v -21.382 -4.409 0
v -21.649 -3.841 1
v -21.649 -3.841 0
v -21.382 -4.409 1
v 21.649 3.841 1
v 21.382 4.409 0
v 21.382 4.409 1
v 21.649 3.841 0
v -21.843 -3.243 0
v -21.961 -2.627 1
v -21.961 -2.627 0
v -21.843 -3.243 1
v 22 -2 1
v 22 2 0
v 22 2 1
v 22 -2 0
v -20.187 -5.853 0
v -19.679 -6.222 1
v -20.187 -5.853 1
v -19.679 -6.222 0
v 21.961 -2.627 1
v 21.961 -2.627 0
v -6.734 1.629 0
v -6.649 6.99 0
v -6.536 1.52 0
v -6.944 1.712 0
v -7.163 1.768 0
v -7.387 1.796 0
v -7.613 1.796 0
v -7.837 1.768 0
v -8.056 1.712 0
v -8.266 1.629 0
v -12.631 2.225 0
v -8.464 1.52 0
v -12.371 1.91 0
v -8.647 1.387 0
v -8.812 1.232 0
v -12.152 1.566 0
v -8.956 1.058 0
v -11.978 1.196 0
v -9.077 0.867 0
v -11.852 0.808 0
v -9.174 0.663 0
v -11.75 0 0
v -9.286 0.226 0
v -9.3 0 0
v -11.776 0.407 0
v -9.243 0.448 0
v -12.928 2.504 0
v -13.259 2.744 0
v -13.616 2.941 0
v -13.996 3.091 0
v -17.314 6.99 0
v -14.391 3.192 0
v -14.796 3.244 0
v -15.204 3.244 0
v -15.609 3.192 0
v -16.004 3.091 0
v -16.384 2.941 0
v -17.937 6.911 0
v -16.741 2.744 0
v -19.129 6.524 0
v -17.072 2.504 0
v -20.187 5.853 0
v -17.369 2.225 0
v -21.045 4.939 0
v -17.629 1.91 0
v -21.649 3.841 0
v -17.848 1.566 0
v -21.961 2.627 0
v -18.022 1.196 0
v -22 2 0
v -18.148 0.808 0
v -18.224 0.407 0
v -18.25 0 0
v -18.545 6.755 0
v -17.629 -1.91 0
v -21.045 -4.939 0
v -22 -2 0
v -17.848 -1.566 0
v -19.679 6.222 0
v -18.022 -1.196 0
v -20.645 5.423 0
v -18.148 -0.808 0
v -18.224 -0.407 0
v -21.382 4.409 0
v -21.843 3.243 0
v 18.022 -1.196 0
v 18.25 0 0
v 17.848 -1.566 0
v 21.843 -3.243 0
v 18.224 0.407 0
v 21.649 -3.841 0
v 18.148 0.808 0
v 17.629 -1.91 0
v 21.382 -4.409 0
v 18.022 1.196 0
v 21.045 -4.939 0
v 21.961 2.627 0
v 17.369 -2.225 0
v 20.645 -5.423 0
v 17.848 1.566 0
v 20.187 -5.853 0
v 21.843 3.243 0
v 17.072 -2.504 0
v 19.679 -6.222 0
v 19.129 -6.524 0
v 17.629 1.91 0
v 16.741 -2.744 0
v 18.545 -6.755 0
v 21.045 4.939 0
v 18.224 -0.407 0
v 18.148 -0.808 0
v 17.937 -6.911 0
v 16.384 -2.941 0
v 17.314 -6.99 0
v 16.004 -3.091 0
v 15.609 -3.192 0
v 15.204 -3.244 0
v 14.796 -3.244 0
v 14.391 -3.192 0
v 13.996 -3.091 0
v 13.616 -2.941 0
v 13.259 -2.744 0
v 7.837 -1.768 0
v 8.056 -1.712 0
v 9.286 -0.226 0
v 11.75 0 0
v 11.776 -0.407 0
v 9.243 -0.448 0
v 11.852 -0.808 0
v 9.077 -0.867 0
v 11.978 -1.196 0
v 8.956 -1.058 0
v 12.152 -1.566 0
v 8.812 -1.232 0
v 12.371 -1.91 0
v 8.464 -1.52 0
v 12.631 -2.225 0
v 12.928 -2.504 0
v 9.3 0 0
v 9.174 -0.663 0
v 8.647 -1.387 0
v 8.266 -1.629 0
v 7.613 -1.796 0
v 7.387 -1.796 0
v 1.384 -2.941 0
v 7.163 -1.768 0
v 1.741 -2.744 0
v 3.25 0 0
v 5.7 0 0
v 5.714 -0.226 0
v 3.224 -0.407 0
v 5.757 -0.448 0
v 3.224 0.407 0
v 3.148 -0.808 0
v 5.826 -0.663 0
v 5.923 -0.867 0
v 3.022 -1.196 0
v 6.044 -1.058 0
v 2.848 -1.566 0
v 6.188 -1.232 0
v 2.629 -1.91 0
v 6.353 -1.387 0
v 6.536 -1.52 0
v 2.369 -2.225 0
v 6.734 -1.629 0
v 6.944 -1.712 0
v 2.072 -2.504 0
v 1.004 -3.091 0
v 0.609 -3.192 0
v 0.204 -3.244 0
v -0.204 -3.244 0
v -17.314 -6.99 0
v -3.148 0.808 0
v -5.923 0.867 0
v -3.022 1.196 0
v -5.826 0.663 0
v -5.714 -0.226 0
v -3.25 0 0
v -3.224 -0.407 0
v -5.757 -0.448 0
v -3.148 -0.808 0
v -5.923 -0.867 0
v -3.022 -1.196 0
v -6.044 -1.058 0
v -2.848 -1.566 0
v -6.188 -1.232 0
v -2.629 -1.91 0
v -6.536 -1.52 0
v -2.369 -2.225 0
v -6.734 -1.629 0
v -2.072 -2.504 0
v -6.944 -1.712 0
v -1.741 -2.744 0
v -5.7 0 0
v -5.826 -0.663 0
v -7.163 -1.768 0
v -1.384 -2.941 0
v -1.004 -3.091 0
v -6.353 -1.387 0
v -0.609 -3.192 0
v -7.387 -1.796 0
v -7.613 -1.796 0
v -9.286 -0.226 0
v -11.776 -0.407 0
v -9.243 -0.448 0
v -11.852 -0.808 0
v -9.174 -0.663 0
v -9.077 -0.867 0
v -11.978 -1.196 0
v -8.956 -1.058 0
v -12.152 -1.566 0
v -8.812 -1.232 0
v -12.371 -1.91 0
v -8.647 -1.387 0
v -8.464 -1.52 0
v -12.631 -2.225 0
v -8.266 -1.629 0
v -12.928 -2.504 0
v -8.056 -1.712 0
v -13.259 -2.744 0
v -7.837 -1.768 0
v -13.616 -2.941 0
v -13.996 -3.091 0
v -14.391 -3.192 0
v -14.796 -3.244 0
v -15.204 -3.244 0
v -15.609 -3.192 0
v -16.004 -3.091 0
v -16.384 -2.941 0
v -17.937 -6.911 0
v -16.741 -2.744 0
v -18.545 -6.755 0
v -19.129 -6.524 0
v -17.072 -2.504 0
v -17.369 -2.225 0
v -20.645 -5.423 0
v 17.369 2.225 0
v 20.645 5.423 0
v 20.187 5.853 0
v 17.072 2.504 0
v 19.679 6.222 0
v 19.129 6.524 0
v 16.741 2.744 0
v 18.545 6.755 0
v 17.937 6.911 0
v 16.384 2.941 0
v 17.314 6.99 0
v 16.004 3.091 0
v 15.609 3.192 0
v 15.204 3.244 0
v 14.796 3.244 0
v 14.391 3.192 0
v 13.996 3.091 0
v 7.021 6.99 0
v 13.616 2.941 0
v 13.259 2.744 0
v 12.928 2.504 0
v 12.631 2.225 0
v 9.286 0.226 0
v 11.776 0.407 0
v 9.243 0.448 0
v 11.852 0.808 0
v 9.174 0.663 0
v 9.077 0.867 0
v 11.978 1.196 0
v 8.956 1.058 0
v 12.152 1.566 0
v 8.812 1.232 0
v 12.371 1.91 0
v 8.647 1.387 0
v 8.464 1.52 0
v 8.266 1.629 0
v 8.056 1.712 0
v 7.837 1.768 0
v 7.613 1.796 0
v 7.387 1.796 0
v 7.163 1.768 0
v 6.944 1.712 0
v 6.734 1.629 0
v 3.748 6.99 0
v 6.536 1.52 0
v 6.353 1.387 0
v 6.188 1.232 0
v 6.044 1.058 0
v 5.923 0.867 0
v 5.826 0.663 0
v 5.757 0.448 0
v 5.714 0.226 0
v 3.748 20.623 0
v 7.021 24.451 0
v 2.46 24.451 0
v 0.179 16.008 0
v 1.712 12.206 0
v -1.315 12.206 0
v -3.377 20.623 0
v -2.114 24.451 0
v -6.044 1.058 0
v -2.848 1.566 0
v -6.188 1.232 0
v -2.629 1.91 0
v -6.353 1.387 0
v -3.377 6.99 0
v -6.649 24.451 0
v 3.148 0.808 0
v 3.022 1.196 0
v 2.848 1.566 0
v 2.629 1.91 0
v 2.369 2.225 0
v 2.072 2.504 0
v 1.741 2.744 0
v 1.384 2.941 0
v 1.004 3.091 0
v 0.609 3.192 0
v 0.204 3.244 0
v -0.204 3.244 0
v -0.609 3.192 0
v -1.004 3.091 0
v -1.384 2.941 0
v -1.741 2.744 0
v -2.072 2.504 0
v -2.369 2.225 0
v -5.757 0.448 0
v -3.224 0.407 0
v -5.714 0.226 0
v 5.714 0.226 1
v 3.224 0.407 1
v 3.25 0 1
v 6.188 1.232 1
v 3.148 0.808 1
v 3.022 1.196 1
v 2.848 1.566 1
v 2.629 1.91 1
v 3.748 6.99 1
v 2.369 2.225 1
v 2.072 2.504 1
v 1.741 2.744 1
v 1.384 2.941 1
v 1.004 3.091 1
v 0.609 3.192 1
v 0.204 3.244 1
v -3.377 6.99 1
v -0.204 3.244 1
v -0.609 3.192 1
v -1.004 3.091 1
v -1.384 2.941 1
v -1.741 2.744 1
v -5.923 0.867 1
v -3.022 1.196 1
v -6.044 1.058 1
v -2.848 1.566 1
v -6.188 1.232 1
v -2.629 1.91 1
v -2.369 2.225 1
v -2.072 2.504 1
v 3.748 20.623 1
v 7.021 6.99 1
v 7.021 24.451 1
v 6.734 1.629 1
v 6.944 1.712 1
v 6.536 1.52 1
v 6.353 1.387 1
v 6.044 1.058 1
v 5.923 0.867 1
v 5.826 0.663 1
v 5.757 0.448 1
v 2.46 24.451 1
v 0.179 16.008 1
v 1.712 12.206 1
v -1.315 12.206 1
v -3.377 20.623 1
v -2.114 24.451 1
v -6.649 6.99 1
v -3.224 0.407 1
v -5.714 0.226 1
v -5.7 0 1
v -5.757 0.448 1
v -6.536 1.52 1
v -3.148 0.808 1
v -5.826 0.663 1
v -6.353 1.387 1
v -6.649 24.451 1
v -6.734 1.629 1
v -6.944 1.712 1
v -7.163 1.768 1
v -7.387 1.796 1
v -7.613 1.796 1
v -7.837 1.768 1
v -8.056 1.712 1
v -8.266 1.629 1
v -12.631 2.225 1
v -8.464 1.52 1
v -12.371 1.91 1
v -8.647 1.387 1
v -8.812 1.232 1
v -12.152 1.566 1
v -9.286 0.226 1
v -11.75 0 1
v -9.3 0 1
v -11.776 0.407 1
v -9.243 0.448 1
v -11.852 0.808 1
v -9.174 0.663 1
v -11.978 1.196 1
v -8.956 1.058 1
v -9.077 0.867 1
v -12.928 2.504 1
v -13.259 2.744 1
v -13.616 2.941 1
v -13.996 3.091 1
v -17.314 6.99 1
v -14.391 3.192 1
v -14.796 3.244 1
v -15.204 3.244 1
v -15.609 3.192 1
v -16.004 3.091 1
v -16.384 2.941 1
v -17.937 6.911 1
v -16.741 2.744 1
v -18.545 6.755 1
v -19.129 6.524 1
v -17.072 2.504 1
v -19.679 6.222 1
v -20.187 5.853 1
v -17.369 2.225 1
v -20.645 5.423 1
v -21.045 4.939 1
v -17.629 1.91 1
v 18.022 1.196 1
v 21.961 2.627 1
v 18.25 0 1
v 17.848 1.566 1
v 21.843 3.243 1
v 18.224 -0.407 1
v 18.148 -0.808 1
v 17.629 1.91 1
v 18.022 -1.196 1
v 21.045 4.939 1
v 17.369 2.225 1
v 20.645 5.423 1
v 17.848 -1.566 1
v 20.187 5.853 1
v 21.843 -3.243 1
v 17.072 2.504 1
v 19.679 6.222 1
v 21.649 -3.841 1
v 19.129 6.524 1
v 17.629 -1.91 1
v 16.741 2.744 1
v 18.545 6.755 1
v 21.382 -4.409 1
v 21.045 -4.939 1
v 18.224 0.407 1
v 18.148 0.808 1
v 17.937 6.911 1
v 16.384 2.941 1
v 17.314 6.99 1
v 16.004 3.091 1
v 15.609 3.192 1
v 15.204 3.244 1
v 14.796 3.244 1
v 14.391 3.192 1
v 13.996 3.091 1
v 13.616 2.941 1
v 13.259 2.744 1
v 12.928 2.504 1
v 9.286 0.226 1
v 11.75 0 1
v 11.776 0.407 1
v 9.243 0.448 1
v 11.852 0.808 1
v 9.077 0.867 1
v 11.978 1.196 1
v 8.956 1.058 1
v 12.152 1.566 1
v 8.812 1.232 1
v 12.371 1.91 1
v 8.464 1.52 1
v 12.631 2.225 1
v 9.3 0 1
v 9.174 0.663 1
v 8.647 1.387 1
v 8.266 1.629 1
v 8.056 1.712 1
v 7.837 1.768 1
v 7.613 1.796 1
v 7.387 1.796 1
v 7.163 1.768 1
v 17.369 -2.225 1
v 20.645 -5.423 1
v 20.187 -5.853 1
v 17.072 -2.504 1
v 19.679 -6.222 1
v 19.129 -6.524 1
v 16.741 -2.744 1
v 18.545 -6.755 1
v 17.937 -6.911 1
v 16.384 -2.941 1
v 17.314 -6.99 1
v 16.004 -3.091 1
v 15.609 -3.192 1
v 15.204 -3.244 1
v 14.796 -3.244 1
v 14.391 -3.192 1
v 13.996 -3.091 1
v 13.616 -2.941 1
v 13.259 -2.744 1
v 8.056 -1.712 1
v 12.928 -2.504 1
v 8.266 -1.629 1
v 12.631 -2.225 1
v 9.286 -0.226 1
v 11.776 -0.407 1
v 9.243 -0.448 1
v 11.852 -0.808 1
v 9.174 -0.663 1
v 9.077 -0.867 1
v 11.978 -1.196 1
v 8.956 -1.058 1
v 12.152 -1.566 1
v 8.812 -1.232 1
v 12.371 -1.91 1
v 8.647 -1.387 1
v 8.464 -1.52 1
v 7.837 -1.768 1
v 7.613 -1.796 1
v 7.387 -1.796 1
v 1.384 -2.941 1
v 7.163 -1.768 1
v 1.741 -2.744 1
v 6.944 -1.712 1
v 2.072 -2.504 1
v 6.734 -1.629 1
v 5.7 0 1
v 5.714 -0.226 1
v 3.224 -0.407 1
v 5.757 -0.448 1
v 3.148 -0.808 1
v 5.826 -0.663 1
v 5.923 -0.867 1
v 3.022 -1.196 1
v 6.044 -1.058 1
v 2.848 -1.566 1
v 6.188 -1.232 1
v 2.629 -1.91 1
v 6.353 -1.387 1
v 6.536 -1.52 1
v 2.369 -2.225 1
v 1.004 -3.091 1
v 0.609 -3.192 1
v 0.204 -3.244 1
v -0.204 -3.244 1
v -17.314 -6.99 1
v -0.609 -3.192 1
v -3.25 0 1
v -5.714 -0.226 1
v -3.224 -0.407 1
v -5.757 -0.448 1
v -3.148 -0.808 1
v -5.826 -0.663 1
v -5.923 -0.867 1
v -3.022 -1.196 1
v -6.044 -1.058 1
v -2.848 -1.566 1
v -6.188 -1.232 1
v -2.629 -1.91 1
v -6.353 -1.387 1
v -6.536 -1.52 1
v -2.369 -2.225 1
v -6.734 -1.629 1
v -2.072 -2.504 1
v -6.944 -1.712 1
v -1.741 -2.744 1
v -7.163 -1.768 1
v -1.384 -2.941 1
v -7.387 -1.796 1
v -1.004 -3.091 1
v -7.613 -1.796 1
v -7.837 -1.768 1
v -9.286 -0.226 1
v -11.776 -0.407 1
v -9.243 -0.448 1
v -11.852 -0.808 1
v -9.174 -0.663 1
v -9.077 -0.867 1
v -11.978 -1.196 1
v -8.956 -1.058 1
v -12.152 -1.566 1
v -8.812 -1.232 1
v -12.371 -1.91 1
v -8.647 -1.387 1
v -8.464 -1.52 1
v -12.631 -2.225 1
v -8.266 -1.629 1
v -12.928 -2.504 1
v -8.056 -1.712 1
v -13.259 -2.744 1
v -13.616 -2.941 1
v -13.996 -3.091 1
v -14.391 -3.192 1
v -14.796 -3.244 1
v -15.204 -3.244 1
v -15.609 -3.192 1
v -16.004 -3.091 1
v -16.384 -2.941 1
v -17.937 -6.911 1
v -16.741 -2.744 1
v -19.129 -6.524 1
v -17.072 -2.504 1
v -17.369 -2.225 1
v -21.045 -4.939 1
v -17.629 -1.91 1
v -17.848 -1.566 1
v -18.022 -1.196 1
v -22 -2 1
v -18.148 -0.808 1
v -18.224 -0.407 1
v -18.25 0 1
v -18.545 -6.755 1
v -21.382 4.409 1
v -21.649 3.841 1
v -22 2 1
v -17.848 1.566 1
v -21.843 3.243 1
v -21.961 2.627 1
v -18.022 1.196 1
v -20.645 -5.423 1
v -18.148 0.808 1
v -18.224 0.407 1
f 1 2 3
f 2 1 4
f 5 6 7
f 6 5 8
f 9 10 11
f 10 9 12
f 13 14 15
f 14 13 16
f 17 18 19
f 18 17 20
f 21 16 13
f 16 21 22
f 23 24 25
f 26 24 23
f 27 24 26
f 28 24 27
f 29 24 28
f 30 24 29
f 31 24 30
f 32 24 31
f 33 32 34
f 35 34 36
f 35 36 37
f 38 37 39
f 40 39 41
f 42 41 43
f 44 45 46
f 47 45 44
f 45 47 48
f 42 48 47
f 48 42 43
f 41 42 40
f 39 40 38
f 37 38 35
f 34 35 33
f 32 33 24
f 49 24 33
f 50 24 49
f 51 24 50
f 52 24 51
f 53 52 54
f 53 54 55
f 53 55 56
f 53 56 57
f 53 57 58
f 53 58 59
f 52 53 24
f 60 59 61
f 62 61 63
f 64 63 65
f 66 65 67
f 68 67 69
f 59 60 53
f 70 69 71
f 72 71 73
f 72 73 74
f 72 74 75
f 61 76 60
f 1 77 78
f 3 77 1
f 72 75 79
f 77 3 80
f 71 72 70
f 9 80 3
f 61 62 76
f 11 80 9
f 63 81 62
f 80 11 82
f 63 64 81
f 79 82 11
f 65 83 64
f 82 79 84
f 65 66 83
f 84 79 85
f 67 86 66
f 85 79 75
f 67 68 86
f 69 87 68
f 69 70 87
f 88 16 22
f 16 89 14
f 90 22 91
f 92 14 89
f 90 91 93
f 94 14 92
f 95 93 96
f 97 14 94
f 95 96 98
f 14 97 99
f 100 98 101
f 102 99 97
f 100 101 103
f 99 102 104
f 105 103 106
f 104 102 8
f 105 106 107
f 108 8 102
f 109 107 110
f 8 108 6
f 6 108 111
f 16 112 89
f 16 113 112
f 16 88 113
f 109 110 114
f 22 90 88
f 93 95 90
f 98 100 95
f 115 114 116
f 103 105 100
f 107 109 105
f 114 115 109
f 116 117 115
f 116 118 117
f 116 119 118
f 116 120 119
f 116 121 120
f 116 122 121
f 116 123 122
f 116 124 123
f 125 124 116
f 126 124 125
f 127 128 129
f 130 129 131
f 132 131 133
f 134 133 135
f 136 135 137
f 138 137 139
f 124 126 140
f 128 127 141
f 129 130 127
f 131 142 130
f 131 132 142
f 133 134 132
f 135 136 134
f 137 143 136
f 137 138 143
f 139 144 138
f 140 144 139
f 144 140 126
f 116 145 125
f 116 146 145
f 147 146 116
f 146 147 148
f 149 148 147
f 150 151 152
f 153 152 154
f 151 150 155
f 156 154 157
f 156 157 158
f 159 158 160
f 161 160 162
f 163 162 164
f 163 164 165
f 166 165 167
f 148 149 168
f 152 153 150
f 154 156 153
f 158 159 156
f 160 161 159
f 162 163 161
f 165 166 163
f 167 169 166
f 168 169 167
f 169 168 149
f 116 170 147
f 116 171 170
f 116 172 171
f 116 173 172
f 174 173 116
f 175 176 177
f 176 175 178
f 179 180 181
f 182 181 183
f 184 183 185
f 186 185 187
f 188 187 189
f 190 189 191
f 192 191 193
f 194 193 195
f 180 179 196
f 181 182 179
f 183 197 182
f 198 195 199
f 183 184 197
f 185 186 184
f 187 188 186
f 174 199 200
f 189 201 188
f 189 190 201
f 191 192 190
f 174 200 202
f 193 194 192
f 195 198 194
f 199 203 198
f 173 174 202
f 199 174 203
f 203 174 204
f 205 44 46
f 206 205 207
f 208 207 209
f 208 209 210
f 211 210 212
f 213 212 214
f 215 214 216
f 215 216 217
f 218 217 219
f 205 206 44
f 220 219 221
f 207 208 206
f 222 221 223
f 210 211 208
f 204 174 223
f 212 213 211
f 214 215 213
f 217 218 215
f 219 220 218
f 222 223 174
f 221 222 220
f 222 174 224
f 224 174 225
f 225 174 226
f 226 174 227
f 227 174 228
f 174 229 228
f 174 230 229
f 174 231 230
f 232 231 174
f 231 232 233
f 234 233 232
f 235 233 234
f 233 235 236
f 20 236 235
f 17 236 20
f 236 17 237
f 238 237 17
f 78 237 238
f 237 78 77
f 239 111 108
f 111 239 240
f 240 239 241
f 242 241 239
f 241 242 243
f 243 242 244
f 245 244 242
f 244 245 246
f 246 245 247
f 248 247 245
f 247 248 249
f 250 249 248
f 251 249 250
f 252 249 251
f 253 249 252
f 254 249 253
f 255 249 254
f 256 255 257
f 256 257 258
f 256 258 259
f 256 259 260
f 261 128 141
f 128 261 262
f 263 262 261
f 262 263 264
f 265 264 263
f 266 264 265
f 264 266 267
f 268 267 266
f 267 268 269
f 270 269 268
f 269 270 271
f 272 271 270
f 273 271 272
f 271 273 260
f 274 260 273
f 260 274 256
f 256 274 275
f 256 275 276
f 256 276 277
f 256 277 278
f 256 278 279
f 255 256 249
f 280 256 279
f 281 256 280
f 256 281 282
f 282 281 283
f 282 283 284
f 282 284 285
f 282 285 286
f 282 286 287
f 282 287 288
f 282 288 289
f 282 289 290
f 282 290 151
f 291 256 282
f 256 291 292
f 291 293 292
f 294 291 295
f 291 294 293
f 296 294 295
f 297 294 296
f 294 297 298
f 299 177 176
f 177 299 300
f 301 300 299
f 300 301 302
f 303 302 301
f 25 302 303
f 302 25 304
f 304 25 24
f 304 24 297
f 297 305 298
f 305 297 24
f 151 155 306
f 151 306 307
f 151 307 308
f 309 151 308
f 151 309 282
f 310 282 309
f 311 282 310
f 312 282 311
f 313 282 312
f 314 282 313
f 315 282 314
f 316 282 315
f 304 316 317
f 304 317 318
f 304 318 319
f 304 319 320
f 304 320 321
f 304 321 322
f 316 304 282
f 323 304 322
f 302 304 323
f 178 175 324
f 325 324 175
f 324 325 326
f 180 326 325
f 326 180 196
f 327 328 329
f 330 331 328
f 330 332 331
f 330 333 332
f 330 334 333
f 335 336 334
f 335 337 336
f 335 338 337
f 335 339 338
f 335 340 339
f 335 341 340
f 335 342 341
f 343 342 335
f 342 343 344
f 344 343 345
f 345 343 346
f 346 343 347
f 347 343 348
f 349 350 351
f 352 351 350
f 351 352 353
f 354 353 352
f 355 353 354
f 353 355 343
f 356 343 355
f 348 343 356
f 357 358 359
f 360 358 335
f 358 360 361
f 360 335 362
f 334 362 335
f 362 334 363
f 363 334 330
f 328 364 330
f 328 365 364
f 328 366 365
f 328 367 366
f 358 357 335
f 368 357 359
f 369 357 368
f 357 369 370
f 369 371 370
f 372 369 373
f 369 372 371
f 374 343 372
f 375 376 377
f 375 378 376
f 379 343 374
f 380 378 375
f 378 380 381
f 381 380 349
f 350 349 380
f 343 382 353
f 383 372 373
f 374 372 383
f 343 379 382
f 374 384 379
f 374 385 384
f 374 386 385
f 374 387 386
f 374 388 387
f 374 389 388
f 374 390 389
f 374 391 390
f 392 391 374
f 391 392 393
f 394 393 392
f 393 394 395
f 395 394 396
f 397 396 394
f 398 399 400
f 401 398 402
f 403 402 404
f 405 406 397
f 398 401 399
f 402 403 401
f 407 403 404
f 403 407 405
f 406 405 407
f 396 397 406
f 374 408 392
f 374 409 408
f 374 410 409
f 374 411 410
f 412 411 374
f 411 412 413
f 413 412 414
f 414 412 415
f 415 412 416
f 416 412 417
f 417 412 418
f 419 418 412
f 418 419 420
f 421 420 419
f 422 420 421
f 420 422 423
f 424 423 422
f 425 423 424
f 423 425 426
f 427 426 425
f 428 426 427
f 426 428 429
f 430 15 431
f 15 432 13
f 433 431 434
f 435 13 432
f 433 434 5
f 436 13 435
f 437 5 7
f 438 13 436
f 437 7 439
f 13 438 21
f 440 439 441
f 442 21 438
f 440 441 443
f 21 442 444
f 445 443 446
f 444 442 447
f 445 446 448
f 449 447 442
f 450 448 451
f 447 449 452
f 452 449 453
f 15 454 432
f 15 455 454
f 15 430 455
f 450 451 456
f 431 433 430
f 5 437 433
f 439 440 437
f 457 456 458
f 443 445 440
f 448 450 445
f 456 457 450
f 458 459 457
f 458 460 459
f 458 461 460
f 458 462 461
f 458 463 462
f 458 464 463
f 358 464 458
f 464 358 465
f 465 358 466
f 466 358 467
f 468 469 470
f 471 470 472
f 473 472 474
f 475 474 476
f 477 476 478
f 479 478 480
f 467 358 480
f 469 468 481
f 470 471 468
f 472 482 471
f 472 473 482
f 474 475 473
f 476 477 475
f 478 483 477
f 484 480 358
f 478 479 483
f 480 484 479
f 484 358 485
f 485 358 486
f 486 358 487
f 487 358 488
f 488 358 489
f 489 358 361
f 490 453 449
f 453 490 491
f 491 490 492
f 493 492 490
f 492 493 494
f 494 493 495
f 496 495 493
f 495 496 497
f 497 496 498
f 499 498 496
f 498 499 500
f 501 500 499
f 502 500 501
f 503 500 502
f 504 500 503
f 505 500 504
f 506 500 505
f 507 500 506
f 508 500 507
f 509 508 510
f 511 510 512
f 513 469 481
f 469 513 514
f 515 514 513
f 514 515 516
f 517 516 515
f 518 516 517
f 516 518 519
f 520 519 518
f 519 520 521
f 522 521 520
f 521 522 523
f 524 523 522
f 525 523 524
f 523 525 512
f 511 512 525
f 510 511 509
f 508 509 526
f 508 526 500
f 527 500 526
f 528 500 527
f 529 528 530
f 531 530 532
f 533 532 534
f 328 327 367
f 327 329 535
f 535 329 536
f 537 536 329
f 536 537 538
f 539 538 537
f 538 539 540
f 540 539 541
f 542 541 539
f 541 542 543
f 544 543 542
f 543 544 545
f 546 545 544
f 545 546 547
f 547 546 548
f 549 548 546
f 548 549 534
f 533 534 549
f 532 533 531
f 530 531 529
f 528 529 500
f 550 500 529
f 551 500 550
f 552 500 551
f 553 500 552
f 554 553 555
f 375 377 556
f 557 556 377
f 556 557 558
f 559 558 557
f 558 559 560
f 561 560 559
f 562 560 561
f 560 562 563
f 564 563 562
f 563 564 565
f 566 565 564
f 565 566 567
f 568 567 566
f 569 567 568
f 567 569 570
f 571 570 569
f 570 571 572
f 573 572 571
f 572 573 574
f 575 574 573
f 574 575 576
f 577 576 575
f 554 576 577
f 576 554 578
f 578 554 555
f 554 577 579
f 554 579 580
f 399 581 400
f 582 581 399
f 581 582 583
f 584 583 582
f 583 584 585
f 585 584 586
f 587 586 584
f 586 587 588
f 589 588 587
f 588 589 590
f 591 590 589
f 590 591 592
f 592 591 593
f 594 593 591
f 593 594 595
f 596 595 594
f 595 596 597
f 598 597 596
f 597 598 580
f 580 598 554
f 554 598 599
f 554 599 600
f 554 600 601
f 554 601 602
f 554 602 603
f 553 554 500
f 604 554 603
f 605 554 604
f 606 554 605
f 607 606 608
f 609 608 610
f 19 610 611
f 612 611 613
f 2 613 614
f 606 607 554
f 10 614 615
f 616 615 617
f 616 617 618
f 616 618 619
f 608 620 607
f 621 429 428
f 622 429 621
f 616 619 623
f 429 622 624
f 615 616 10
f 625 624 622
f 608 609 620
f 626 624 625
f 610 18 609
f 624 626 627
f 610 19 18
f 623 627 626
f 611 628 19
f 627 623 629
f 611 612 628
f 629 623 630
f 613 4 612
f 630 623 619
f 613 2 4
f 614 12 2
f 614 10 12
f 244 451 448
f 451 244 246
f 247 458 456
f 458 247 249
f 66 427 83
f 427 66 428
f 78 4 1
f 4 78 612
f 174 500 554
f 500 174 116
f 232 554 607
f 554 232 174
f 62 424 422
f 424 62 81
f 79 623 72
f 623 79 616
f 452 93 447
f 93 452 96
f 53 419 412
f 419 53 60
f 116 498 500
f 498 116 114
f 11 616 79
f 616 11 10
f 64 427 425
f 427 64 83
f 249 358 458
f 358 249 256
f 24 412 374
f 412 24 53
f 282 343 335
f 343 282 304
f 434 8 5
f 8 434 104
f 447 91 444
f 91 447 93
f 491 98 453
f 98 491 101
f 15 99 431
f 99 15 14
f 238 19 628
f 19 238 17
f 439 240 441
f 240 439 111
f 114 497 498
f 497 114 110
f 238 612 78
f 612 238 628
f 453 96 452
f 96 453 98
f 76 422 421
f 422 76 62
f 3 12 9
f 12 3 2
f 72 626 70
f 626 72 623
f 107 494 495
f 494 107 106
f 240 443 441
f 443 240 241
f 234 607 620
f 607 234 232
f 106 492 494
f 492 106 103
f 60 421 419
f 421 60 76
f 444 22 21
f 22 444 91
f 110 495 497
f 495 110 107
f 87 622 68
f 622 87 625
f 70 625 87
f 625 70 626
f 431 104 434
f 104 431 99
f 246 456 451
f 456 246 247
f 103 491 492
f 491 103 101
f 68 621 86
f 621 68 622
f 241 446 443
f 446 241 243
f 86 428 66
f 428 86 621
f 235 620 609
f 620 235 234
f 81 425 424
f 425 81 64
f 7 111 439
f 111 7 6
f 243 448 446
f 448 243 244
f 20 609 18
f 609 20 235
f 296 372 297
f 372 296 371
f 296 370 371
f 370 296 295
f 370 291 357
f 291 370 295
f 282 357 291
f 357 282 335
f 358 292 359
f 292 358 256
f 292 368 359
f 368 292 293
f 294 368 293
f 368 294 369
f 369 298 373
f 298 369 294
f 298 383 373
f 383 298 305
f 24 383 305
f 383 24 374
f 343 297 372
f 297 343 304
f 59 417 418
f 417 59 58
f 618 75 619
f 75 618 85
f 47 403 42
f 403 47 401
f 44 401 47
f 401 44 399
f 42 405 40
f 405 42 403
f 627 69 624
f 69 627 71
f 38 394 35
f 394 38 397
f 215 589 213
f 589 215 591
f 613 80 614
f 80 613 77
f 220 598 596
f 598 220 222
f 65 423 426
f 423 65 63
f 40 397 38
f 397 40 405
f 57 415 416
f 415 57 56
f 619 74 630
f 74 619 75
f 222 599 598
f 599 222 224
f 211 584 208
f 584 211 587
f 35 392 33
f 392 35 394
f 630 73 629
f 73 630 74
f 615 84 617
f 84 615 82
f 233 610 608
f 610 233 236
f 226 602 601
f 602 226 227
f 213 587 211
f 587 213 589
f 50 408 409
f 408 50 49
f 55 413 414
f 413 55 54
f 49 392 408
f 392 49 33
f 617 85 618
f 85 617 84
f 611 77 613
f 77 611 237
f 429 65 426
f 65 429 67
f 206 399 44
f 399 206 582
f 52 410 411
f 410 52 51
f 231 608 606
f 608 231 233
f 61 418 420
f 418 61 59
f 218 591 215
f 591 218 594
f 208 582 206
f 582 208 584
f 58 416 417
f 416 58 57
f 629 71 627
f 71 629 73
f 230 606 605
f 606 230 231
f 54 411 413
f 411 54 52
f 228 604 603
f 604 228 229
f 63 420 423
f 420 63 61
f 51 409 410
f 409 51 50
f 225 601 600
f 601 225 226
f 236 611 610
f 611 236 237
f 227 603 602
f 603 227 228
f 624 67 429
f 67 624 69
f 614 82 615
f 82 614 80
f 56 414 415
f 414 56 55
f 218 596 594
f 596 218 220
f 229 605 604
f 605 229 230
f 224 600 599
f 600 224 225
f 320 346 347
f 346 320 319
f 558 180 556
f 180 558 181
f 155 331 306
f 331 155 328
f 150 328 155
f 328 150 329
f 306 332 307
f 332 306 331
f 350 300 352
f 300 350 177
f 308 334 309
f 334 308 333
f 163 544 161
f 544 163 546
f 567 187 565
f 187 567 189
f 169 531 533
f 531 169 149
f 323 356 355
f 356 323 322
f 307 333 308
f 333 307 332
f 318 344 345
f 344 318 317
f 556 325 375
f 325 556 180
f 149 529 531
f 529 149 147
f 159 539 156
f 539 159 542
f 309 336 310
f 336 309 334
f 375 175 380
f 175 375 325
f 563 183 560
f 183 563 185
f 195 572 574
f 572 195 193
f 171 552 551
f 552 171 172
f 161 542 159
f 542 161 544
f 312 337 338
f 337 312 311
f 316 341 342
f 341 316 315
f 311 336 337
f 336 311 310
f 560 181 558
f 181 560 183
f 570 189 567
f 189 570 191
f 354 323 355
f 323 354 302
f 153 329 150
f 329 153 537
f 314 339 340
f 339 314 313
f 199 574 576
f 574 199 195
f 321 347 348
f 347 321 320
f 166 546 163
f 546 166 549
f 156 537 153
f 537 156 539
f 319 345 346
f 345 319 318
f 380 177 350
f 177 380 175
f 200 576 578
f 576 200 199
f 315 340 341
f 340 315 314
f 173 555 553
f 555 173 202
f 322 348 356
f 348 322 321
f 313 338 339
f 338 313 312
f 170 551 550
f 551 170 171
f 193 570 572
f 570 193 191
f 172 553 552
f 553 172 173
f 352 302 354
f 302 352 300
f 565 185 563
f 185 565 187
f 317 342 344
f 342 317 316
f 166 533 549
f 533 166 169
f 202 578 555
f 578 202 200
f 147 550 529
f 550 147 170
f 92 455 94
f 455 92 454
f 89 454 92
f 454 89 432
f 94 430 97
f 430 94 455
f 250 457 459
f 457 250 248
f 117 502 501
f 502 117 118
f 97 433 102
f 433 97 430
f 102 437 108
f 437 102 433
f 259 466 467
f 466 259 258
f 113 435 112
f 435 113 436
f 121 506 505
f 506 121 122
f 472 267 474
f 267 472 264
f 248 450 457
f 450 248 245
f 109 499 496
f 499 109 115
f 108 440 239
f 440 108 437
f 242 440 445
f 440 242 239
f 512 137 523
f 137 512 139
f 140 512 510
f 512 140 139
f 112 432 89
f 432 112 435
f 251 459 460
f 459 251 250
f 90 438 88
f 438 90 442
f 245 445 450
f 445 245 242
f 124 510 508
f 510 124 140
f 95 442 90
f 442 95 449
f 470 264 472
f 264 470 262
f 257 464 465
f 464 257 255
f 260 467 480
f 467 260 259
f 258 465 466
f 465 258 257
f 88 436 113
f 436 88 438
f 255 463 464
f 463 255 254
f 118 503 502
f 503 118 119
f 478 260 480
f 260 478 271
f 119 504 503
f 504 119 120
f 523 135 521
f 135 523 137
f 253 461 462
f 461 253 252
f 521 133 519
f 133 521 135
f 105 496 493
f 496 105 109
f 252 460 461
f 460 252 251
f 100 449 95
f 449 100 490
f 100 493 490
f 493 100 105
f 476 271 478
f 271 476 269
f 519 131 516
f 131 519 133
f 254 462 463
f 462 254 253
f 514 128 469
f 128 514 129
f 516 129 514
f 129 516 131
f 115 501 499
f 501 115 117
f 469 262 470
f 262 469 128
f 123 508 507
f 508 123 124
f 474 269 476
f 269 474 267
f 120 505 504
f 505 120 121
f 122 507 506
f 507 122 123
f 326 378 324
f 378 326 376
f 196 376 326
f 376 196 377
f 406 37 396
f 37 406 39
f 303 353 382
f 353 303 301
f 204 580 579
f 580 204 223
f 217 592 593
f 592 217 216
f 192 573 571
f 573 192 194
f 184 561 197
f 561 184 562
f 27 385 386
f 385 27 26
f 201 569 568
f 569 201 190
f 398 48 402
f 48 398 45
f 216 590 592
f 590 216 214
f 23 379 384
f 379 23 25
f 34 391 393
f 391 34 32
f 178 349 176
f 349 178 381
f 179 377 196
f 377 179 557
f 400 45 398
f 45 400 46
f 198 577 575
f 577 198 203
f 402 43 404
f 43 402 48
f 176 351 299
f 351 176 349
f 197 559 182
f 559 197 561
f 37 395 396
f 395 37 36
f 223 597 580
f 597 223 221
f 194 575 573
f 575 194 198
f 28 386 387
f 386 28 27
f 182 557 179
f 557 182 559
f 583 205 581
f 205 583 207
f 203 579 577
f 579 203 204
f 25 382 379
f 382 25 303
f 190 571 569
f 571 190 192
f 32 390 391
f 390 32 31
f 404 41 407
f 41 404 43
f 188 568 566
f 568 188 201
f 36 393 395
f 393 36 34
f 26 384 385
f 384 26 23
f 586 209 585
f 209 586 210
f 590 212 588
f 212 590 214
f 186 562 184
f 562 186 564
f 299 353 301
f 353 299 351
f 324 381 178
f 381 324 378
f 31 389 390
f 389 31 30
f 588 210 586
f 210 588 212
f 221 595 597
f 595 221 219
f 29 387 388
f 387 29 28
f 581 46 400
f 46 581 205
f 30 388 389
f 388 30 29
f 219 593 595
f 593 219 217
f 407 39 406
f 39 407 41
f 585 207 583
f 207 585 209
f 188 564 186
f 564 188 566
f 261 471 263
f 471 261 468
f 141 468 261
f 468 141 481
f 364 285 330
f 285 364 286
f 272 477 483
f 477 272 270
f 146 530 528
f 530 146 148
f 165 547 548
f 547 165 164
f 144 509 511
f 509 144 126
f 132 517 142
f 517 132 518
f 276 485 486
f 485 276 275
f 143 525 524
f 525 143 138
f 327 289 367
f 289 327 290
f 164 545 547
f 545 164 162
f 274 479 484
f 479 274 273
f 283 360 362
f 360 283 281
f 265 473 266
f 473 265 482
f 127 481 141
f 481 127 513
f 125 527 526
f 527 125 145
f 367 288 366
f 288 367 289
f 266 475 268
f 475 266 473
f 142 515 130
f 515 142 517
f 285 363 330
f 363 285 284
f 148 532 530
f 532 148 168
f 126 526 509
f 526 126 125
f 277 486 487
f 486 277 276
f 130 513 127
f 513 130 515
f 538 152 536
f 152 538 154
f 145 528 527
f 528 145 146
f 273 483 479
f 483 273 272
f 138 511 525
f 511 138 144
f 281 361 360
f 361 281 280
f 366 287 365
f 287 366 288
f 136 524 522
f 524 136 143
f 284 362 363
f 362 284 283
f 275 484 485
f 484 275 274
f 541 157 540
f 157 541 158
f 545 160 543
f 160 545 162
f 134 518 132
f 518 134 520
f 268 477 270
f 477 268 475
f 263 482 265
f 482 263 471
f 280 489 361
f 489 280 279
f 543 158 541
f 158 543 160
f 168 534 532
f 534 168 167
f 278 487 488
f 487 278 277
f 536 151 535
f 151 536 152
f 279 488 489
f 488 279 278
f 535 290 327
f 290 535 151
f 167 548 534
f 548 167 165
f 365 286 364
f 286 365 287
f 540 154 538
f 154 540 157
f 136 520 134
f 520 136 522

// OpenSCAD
$fn = 50;


difference() {
	union() {
		hull() {
			translate(v = [-17.0000000000, 2.0000000000, 0]) {
				cylinder(h = 1, r = 5);
			}
			translate(v = [17.0000000000, 2.0000000000, 0]) {
				cylinder(h = 1, r = 5);
			}
			translate(v = [-17.0000000000, -2.0000000000, 0]) {
				cylinder(h = 1, r = 5);
			}
			translate(v = [17.0000000000, -2.0000000000, 0]) {
				cylinder(h = 1, r = 5);
			}
		}
		translate(v = [0, 24, 0]) {
			linear_extrude(height = 1) {
				text(font = "DejaVu Sans Mono:style=Bold", halign = "center", size = 19.0000000000, text = "M", valign = "top");
			}
		}
	}
	union() {
		translate(v = [-15.0000000000, 0.0000000000, 0]) {
			translate(v = [0, 0, -100]) {
				cylinder(h = 200, r = 3.2500000000);
			}
		}
		translate(v = [0, 0, -100]) {
			cylinder(h = 200, r = 3.2500000000);
		}
		translate(v = [15.0000000000, 0.0000000000, 0]) {
			translate(v = [0, 0, -100]) {
				cylinder(h = 200, r = 3.2500000000);
			}
		}
		translate(v = [-15.0000000000, 0.0000000000, 0]) {
			translate(v = [0, 0, -100]) {
				cylinder(h = 200, r = 1.8000000000);
			}
		}
		translate(v = [-7.5000000000, 0.0000000000, 0]) {
			translate(v = [0, 0, -100]) {
				cylinder(h = 200, r = 1.8000000000);
			}
		}
		translate(v = [0, 0, -100]) {
			cylinder(h = 200, r = 1.8000000000);
		}
		translate(v = [7.5000000000, 0.0000000000, 0]) {
			translate(v = [0, 0, -100]) {
				cylinder(h = 200, r = 1.8000000000);
			}
		}
		translate(v = [15.0000000000, 0.0000000000, 0]) {
			translate(v = [0, 0, -100]) {
				cylinder(h = 200, r = 1.8000000000);
			}
		}
	}
}
